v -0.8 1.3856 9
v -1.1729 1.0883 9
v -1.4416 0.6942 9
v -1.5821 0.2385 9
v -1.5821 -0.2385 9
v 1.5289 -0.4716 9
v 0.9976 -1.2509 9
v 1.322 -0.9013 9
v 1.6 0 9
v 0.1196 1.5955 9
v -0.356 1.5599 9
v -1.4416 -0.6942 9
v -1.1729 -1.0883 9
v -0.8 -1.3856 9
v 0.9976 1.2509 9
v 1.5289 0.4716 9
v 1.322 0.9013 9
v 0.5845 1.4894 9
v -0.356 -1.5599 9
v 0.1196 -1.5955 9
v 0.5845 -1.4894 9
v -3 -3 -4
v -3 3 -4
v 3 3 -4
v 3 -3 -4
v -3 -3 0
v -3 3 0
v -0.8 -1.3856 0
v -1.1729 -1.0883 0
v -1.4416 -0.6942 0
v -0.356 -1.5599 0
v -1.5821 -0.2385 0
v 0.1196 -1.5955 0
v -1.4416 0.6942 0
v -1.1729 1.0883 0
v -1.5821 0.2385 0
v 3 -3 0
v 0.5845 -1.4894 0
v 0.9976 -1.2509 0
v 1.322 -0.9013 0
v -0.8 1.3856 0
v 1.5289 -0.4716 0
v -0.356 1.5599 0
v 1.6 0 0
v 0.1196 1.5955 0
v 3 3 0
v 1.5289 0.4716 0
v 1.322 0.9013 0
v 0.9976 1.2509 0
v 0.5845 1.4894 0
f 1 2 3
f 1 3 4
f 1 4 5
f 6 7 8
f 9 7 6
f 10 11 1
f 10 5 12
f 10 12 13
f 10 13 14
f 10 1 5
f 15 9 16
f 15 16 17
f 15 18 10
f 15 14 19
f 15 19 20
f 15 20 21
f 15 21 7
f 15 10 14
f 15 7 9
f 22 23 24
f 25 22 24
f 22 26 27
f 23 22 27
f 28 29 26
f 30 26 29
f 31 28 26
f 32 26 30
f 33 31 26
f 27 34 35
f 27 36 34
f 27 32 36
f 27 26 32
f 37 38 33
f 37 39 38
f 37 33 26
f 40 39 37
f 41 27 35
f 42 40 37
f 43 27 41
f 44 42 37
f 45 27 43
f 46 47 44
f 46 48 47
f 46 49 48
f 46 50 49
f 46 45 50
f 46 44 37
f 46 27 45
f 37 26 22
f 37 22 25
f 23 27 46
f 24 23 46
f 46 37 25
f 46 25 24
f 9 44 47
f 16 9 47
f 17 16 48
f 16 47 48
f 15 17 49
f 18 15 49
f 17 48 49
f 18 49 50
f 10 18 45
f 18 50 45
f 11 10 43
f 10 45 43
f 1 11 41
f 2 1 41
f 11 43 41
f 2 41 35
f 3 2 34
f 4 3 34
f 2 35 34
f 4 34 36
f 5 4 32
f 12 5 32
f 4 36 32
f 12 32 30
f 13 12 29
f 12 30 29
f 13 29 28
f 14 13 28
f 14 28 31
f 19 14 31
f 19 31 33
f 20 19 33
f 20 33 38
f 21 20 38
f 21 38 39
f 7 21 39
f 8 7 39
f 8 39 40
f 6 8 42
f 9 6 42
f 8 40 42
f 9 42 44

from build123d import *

# Parameters (mm, degrees)
F0_W     = 6
F0_H     = 6
F0_R     = 1.6
F1_DEPTH = 4
F2_DEPTH = 9


with BuildPart() as f1:
    # F0 (on Top) → F1 (new body)
    with BuildSketch(Plane.XY):
        Rectangle(F0_W, F0_H)
        Circle(F0_R, mode=Mode.SUBTRACT)
        Circle(F0_R)
    extrude(amount=-F1_DEPTH)

    # F0 (on Top) → F2 (join)
    with BuildSketch(Plane.XY):
        Circle(F0_R)
    extrude(amount=F2_DEPTH)


solid = f1.part
